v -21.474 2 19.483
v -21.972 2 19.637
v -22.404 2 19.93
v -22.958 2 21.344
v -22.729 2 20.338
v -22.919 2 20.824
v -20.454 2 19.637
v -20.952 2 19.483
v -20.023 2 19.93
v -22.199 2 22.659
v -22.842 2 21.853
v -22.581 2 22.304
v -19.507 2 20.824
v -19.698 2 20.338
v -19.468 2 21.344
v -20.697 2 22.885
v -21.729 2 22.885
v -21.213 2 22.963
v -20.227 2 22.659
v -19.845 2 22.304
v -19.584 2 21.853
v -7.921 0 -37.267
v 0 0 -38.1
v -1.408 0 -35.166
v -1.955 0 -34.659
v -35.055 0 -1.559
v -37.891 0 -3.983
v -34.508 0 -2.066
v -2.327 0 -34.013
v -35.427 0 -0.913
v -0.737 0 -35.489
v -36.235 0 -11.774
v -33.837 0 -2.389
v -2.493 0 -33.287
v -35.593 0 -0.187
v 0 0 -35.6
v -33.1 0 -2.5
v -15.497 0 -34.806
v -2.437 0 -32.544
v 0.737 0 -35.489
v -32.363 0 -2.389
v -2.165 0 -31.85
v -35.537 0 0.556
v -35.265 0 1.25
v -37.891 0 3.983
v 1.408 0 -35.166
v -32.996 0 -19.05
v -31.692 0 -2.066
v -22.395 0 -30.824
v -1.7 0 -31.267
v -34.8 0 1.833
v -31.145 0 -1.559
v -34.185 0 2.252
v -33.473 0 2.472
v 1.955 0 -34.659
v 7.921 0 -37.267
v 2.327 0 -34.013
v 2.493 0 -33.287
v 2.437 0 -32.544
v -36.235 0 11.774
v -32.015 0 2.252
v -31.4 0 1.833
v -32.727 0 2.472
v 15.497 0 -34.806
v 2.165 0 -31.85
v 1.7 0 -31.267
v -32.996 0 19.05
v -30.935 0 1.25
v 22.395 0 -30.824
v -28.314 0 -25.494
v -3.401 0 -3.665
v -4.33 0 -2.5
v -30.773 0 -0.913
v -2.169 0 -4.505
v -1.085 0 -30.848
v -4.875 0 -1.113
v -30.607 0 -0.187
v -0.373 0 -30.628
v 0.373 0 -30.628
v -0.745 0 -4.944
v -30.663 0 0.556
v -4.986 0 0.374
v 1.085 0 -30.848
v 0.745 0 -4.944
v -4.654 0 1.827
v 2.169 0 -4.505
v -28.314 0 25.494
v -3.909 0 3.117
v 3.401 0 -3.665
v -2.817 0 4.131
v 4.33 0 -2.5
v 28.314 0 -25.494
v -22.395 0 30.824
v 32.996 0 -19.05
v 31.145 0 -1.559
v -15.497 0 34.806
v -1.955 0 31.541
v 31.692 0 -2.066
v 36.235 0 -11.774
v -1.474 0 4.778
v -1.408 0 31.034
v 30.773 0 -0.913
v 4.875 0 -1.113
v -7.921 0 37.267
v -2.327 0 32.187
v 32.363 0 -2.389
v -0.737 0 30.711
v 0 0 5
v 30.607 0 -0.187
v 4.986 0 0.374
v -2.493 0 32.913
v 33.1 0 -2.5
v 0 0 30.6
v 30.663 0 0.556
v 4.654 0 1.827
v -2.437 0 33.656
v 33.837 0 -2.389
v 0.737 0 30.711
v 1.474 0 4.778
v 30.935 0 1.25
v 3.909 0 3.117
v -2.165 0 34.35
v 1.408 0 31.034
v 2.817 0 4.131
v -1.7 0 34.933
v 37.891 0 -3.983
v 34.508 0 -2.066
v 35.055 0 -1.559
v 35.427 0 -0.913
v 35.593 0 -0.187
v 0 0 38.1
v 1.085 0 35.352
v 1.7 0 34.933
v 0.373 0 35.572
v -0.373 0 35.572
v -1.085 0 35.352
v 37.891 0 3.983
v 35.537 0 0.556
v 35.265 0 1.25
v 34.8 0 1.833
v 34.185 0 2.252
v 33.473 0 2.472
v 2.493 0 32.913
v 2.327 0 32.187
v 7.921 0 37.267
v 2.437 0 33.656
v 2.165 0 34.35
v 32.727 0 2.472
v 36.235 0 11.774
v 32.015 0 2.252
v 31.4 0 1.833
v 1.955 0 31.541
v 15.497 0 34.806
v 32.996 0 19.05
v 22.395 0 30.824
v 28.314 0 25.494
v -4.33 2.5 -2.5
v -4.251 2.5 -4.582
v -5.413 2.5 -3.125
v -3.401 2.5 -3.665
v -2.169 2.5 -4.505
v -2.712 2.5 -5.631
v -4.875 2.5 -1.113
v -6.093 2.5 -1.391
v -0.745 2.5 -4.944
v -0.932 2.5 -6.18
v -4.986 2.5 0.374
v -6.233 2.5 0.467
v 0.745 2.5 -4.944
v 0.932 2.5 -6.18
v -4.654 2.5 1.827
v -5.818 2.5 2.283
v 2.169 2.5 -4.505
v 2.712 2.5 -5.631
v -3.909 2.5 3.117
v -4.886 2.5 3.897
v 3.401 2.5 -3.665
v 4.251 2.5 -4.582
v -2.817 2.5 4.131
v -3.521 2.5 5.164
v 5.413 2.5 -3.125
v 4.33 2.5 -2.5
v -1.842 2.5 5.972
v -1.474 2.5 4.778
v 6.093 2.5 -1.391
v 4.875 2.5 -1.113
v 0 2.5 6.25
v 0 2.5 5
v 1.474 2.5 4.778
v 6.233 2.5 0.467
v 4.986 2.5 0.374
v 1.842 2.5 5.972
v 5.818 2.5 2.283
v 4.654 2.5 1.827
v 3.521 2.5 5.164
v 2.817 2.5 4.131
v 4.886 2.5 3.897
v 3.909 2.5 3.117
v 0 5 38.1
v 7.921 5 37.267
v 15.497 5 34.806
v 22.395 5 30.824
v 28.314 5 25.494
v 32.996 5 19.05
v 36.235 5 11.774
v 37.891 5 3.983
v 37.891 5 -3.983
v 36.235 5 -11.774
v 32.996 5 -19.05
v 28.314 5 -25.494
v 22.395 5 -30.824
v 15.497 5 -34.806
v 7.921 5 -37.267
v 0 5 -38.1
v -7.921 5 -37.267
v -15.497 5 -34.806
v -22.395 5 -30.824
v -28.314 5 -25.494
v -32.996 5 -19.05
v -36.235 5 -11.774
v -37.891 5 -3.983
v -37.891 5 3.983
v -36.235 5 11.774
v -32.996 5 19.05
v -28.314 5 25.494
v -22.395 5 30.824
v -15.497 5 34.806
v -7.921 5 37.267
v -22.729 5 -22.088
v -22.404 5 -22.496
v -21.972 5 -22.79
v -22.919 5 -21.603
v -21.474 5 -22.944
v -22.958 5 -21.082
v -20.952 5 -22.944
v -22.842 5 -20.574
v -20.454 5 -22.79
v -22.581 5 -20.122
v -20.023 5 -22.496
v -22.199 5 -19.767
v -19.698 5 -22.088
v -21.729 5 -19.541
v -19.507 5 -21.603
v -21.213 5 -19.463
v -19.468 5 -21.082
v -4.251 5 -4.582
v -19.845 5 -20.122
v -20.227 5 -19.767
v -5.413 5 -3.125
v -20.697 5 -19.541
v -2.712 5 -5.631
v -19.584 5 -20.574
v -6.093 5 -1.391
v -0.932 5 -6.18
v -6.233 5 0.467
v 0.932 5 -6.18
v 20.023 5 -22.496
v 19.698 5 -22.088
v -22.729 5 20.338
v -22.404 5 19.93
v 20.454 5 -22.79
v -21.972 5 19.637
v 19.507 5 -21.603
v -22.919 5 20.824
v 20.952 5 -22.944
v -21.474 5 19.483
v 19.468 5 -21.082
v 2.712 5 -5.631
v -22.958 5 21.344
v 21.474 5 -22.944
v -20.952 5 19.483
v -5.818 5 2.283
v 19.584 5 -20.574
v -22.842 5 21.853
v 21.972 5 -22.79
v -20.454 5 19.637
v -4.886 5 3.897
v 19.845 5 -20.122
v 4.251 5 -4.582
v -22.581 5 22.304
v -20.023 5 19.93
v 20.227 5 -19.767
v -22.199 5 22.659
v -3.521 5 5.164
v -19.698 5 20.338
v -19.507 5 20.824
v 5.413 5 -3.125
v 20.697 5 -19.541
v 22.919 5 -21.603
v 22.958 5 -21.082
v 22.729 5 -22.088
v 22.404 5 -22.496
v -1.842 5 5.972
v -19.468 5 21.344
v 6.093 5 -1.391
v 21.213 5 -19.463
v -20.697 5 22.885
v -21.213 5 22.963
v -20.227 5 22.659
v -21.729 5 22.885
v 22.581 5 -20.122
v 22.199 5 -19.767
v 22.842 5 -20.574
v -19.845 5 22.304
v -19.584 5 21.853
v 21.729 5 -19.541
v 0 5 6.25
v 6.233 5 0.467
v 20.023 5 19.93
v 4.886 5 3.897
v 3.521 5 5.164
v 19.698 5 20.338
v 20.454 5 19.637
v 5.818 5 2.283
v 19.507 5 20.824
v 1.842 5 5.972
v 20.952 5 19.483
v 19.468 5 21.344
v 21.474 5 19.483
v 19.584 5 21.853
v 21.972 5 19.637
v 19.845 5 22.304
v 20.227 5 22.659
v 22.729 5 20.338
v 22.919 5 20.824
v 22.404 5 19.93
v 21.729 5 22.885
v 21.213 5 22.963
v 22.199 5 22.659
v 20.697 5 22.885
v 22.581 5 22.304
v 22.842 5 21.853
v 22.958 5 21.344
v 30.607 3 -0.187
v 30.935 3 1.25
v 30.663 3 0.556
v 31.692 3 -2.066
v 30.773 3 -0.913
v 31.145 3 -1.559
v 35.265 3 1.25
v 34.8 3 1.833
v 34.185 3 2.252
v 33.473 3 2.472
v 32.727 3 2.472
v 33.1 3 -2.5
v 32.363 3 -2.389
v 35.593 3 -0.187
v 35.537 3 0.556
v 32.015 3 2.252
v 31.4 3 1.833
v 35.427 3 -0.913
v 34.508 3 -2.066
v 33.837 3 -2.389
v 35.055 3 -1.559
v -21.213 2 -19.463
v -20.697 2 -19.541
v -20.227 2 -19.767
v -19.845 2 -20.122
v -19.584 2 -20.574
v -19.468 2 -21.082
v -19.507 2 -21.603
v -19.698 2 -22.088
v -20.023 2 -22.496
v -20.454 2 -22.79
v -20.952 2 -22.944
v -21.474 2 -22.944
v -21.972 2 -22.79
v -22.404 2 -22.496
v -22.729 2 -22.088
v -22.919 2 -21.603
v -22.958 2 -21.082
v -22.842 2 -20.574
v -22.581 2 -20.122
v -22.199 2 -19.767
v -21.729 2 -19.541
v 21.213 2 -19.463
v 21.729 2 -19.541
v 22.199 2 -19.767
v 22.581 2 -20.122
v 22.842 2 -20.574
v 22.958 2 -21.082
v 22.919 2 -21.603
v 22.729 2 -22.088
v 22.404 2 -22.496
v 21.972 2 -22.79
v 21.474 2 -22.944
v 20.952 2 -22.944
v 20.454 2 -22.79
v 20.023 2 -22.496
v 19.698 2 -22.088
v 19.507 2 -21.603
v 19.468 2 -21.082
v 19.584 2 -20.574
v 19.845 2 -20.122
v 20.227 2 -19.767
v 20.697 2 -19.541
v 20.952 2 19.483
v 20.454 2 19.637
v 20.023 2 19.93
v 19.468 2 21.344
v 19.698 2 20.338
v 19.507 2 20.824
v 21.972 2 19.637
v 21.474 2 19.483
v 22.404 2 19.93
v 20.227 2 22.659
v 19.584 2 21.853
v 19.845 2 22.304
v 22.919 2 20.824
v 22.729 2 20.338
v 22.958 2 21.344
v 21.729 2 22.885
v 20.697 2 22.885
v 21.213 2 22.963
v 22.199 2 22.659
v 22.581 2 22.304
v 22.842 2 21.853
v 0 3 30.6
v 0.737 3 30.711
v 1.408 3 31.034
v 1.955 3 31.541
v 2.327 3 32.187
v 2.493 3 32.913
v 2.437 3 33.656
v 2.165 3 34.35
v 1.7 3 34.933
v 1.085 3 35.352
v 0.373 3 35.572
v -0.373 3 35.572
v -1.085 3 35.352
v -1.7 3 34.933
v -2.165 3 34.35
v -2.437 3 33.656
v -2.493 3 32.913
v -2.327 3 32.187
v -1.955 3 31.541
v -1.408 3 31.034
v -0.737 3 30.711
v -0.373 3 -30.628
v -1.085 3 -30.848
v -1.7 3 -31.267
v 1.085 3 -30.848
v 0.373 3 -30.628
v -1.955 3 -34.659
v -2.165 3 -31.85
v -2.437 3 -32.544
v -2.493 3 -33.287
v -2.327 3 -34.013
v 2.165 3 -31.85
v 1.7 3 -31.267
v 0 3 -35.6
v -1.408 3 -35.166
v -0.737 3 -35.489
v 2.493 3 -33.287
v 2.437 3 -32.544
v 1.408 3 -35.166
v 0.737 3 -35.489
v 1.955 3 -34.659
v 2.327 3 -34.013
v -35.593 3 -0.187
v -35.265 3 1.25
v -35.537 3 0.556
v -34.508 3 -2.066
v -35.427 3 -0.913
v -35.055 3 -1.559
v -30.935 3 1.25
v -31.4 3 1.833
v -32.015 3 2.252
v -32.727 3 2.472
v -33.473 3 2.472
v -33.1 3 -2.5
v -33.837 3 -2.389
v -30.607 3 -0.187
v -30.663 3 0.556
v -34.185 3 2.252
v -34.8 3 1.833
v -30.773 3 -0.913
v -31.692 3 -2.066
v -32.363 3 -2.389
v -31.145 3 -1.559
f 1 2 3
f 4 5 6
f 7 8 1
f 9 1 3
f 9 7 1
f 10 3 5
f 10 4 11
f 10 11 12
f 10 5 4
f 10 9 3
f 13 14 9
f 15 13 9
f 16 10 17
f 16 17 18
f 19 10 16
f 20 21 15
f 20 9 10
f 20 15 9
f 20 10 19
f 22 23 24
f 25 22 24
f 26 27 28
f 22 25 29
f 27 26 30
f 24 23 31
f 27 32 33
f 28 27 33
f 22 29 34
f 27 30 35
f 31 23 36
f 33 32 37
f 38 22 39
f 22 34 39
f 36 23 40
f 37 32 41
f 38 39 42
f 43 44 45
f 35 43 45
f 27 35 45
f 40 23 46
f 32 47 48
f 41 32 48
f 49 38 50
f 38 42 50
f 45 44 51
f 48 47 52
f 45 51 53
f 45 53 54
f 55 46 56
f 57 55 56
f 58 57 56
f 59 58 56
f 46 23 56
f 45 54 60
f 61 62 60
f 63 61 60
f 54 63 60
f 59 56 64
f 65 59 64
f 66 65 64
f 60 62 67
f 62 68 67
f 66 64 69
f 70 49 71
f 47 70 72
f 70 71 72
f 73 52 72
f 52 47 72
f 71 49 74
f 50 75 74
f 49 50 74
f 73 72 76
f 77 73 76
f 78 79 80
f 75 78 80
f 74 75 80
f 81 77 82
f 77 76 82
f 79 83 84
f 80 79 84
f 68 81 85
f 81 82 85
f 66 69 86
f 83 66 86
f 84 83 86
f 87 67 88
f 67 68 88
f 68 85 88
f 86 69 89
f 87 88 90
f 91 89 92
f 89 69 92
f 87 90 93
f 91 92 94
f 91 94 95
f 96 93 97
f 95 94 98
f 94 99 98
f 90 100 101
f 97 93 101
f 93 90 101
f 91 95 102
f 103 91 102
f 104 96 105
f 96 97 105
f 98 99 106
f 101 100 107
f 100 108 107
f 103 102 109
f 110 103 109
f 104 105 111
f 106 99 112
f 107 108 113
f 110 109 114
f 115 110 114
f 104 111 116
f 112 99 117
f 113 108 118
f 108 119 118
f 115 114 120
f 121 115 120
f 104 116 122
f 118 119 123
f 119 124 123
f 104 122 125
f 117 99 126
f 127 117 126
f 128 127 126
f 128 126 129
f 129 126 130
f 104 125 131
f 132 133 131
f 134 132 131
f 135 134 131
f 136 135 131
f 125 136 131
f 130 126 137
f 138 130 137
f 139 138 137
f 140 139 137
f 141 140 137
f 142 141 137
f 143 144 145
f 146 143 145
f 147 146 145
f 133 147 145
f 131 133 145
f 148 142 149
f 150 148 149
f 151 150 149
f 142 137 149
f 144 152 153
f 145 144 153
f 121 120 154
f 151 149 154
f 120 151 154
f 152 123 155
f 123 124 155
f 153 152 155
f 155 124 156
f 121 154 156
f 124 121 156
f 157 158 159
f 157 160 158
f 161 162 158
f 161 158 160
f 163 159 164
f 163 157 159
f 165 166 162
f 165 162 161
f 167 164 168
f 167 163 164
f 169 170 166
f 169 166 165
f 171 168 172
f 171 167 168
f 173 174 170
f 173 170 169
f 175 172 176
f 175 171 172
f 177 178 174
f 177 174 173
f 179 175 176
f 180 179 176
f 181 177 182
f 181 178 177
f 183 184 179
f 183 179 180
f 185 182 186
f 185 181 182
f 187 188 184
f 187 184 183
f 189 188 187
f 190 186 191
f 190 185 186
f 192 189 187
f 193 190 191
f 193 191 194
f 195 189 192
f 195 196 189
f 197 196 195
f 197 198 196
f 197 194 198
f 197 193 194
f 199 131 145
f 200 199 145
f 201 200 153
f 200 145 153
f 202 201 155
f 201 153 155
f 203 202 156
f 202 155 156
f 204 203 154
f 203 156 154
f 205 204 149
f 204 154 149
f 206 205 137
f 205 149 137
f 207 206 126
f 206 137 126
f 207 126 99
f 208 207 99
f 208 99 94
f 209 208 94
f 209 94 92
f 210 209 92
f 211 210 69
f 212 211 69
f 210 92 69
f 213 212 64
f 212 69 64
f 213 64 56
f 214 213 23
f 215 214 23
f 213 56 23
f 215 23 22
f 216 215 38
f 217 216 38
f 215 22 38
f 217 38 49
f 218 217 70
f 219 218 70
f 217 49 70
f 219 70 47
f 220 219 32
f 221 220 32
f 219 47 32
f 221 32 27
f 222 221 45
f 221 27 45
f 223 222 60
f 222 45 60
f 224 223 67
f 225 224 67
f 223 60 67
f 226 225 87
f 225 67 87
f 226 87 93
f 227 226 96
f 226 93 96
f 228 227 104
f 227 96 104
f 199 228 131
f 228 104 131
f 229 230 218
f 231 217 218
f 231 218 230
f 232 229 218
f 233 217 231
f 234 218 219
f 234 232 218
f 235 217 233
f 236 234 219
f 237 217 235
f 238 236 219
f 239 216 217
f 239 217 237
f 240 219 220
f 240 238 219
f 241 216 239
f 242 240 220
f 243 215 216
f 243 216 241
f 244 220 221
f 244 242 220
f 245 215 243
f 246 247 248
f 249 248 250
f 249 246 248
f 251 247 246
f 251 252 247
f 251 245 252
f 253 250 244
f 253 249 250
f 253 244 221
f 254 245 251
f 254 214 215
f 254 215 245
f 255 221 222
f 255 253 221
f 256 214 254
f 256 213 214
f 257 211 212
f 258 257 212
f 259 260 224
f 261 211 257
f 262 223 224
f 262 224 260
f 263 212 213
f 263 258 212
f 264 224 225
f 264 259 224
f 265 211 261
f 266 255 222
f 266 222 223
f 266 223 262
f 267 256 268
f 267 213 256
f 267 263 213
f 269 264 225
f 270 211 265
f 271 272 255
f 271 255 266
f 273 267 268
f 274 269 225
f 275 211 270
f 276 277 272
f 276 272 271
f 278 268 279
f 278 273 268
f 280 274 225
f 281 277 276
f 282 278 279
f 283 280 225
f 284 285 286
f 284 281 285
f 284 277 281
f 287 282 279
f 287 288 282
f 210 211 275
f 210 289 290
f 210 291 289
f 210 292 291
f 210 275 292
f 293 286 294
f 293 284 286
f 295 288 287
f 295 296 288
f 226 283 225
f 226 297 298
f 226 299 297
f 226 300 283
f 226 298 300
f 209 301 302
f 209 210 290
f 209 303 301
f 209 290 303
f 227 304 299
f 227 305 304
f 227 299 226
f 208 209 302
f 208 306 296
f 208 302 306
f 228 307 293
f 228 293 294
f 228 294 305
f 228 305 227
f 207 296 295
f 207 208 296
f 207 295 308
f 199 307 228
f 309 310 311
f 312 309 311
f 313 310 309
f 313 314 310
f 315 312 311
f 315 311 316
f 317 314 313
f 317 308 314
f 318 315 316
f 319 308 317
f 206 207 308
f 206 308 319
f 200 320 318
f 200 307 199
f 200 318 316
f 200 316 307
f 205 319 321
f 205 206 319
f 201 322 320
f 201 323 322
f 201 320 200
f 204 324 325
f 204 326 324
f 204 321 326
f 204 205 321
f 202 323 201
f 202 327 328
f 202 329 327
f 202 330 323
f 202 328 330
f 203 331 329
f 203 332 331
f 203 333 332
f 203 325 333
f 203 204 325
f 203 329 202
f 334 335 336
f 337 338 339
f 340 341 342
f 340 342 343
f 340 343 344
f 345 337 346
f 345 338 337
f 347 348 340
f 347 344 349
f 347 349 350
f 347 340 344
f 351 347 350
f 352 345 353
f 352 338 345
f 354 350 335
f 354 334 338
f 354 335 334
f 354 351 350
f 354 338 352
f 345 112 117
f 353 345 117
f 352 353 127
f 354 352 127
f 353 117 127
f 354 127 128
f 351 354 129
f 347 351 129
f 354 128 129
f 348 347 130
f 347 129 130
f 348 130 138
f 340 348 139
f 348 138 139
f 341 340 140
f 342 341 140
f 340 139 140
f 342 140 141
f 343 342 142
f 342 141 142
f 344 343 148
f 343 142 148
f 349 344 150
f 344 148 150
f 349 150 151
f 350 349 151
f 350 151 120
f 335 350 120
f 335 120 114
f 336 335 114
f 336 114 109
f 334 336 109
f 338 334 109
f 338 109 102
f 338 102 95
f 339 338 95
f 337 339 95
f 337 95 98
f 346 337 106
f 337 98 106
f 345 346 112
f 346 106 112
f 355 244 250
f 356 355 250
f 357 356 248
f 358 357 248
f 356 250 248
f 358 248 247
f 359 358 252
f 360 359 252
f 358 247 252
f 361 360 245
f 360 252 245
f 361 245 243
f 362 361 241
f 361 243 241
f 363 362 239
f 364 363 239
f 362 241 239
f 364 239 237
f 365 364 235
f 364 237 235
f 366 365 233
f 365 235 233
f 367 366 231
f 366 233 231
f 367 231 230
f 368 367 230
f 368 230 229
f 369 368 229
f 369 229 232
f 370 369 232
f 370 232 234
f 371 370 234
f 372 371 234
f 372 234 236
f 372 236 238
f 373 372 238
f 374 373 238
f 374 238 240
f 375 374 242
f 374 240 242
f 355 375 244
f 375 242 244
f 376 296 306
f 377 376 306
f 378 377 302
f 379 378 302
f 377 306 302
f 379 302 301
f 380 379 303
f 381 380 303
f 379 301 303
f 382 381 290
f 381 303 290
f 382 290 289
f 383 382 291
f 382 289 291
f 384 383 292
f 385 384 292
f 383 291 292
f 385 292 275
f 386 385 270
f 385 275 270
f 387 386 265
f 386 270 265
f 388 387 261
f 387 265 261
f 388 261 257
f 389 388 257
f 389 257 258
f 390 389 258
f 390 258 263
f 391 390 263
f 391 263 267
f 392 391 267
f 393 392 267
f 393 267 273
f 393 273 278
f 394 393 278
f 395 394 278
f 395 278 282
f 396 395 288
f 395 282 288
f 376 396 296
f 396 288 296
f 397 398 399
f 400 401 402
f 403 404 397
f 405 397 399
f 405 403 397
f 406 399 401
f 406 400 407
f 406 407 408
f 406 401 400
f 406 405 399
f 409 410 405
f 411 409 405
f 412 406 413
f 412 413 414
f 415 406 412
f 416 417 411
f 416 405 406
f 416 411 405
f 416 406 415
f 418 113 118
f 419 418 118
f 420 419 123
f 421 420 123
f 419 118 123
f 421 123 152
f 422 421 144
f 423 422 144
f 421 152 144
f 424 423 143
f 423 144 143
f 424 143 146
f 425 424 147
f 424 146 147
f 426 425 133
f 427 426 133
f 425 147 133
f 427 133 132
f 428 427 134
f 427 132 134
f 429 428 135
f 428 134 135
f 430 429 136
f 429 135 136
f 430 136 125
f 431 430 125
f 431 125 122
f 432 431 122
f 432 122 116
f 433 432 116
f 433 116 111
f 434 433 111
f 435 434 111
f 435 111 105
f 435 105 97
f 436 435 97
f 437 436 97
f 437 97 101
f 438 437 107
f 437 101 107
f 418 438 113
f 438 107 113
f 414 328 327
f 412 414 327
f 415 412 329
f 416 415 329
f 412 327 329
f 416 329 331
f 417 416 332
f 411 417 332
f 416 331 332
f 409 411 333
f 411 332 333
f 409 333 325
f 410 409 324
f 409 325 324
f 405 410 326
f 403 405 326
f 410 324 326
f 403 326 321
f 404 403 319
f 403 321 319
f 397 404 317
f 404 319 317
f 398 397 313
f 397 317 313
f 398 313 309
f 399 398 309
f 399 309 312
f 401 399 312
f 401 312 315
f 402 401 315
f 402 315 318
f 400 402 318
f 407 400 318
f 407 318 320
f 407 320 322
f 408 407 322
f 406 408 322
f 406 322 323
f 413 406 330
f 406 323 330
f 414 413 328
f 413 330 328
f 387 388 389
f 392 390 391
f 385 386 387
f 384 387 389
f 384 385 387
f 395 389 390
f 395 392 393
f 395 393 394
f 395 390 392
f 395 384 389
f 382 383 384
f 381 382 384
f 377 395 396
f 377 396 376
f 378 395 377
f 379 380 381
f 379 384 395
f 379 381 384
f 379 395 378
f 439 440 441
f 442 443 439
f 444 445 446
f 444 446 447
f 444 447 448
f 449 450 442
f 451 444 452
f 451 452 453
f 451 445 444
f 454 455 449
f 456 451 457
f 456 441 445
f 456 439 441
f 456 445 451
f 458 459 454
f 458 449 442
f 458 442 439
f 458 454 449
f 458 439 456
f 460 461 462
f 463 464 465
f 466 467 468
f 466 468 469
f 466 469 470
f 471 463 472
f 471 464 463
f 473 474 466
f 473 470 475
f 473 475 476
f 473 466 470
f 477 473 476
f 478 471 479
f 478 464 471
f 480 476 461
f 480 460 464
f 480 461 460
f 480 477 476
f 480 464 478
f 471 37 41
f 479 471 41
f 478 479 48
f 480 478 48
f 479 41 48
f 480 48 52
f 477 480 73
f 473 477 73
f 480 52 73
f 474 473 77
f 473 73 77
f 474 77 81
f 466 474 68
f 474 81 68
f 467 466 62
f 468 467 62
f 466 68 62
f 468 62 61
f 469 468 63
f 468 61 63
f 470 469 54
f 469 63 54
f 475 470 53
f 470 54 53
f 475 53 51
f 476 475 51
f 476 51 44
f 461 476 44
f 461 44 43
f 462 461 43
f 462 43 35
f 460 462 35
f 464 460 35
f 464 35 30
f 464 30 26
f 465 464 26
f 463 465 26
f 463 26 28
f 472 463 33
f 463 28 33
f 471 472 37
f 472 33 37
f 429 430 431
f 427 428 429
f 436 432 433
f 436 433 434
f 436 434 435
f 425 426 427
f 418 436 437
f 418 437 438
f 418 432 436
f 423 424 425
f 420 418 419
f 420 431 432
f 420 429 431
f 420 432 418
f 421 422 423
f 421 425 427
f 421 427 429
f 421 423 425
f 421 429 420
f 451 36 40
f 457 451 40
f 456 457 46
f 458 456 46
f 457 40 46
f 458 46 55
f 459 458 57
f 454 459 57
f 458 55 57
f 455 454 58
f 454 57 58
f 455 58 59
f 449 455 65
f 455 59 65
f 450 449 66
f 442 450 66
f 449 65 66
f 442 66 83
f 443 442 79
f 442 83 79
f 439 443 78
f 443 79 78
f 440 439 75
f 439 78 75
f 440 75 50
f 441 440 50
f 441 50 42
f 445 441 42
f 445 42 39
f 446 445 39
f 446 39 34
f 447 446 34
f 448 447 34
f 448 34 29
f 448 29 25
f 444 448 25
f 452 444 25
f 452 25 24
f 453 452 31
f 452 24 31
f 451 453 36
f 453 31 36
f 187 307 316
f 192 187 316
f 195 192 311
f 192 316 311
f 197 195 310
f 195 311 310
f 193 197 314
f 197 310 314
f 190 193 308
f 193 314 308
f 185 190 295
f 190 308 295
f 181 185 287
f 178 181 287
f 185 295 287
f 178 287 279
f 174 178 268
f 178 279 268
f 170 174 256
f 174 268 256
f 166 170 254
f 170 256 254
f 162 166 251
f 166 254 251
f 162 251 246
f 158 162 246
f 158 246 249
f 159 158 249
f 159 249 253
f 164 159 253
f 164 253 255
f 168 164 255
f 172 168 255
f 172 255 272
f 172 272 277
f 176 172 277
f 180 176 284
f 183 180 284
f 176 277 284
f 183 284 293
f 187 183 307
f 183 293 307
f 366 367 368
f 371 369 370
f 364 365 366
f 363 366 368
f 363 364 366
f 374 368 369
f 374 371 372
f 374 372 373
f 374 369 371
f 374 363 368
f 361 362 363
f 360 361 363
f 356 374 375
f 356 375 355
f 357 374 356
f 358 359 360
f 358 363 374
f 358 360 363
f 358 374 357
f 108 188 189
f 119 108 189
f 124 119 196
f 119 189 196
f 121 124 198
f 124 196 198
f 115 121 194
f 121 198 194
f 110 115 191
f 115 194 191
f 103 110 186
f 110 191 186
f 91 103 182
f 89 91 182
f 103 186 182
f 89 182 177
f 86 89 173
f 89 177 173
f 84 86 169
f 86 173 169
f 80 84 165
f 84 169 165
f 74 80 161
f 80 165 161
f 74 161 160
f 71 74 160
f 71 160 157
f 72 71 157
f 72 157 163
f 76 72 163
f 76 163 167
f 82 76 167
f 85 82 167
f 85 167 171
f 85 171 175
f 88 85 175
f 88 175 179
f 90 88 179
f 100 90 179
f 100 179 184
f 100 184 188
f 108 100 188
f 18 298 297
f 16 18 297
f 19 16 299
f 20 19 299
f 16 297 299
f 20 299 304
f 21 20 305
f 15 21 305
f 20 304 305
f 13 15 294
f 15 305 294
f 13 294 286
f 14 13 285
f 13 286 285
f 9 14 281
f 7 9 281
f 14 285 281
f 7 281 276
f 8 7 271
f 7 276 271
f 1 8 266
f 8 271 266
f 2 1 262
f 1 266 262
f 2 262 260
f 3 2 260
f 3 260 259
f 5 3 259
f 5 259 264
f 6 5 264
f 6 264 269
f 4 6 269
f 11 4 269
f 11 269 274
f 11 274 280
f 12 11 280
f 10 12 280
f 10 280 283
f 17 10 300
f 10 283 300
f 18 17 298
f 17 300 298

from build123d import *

# Parameters (mm, degrees)
SKETCH1_R           = 38.1
BOSS_EXTRUDE1_DEPTH = 5
SKETCH5_R           = 1.75
CUT_EXTRUDE5_DEPTH  = 3
SKETCH6_R           = 2.5
CUT_EXTRUDE6_DEPTH  = 3
SKETCH7_R           = 6.25
CUT_EXTRUDE7_DEPTH  = 2.5
SKETCH8_R           = 5
CUT_EXTRUDE10_DEPTH = 55.113029854


with BuildPart() as part:
    # Sketch1 → Boss-Extrude1 (new body)
    with BuildSketch(Plane(origin=(0, 0, 0), x_dir=(1, 0, 0), z_dir=(0, 1, 0))):
        with Locations(Location((0, 0, 0), (0, 0, 270))):
            Circle(SKETCH1_R)
    extrude(amount=BOSS_EXTRUDE1_DEPTH)

    # Sketch5 → Cut-Extrude5 (cut)
    with BuildSketch(Plane(origin=(0, 5, 0), x_dir=(1, 0, 0), z_dir=(0, 1, 0))):
        with Locations(Location((21.213203436, 21.213203436, 0), (0, 0, 270))):
            Circle(SKETCH5_R)
        with Locations(Location((-21.213203436, 21.213203436, 0), (0, 0, 270))):
            Circle(SKETCH5_R)
        with Locations(Location((-21.213203436, -21.213203436, 0), (0, 0, 270))):
            Circle(SKETCH5_R)
        with Locations(Location((21.213203436, -21.213203436, 0), (0, 0, 270))):
            Circle(SKETCH5_R)
    extrude(amount=-CUT_EXTRUDE5_DEPTH, mode=Mode.SUBTRACT)

    # Sketch6 → Cut-Extrude6 (cut)
    with BuildSketch(Plane.XZ):
        with Locations(Location((0, -33.1, 0), (0, 0, 270))):
            Circle(SKETCH6_R)
        with Locations(Location((33.1, 0, 0), (0, 0, 270))):
            Circle(SKETCH6_R)
        with Locations(Location((0, 33.1, 0), (0, 0, 270))):
            Circle(SKETCH6_R)
        with Locations(Location((-33.1, 0, 0), (0, 0, 270))):
            Circle(SKETCH6_R)
    extrude(amount=-CUT_EXTRUDE6_DEPTH, mode=Mode.SUBTRACT)

    # Sketch7 → Cut-Extrude7 (cut)
    with BuildSketch(Plane(origin=(0, 5, 0), x_dir=(1, 0, 0), z_dir=(0, 1, 0))):
        with Locations(Location((0, 0, 0), (0, 0, 270))):
            Circle(SKETCH7_R)
    extrude(amount=-CUT_EXTRUDE7_DEPTH, mode=Mode.SUBTRACT)

    # Sketch8 → Cut-Extrude10 (cut, through all)
    with BuildSketch(Plane(origin=(0, 5, 0), x_dir=(1, 0, 0), z_dir=(0, 1, 0))):
        with Locations(Location((0, 0, 0), (0, 0, 270))):
            Circle(SKETCH8_R)
    extrude(amount=-CUT_EXTRUDE10_DEPTH, mode=Mode.SUBTRACT)


solid = part.part
